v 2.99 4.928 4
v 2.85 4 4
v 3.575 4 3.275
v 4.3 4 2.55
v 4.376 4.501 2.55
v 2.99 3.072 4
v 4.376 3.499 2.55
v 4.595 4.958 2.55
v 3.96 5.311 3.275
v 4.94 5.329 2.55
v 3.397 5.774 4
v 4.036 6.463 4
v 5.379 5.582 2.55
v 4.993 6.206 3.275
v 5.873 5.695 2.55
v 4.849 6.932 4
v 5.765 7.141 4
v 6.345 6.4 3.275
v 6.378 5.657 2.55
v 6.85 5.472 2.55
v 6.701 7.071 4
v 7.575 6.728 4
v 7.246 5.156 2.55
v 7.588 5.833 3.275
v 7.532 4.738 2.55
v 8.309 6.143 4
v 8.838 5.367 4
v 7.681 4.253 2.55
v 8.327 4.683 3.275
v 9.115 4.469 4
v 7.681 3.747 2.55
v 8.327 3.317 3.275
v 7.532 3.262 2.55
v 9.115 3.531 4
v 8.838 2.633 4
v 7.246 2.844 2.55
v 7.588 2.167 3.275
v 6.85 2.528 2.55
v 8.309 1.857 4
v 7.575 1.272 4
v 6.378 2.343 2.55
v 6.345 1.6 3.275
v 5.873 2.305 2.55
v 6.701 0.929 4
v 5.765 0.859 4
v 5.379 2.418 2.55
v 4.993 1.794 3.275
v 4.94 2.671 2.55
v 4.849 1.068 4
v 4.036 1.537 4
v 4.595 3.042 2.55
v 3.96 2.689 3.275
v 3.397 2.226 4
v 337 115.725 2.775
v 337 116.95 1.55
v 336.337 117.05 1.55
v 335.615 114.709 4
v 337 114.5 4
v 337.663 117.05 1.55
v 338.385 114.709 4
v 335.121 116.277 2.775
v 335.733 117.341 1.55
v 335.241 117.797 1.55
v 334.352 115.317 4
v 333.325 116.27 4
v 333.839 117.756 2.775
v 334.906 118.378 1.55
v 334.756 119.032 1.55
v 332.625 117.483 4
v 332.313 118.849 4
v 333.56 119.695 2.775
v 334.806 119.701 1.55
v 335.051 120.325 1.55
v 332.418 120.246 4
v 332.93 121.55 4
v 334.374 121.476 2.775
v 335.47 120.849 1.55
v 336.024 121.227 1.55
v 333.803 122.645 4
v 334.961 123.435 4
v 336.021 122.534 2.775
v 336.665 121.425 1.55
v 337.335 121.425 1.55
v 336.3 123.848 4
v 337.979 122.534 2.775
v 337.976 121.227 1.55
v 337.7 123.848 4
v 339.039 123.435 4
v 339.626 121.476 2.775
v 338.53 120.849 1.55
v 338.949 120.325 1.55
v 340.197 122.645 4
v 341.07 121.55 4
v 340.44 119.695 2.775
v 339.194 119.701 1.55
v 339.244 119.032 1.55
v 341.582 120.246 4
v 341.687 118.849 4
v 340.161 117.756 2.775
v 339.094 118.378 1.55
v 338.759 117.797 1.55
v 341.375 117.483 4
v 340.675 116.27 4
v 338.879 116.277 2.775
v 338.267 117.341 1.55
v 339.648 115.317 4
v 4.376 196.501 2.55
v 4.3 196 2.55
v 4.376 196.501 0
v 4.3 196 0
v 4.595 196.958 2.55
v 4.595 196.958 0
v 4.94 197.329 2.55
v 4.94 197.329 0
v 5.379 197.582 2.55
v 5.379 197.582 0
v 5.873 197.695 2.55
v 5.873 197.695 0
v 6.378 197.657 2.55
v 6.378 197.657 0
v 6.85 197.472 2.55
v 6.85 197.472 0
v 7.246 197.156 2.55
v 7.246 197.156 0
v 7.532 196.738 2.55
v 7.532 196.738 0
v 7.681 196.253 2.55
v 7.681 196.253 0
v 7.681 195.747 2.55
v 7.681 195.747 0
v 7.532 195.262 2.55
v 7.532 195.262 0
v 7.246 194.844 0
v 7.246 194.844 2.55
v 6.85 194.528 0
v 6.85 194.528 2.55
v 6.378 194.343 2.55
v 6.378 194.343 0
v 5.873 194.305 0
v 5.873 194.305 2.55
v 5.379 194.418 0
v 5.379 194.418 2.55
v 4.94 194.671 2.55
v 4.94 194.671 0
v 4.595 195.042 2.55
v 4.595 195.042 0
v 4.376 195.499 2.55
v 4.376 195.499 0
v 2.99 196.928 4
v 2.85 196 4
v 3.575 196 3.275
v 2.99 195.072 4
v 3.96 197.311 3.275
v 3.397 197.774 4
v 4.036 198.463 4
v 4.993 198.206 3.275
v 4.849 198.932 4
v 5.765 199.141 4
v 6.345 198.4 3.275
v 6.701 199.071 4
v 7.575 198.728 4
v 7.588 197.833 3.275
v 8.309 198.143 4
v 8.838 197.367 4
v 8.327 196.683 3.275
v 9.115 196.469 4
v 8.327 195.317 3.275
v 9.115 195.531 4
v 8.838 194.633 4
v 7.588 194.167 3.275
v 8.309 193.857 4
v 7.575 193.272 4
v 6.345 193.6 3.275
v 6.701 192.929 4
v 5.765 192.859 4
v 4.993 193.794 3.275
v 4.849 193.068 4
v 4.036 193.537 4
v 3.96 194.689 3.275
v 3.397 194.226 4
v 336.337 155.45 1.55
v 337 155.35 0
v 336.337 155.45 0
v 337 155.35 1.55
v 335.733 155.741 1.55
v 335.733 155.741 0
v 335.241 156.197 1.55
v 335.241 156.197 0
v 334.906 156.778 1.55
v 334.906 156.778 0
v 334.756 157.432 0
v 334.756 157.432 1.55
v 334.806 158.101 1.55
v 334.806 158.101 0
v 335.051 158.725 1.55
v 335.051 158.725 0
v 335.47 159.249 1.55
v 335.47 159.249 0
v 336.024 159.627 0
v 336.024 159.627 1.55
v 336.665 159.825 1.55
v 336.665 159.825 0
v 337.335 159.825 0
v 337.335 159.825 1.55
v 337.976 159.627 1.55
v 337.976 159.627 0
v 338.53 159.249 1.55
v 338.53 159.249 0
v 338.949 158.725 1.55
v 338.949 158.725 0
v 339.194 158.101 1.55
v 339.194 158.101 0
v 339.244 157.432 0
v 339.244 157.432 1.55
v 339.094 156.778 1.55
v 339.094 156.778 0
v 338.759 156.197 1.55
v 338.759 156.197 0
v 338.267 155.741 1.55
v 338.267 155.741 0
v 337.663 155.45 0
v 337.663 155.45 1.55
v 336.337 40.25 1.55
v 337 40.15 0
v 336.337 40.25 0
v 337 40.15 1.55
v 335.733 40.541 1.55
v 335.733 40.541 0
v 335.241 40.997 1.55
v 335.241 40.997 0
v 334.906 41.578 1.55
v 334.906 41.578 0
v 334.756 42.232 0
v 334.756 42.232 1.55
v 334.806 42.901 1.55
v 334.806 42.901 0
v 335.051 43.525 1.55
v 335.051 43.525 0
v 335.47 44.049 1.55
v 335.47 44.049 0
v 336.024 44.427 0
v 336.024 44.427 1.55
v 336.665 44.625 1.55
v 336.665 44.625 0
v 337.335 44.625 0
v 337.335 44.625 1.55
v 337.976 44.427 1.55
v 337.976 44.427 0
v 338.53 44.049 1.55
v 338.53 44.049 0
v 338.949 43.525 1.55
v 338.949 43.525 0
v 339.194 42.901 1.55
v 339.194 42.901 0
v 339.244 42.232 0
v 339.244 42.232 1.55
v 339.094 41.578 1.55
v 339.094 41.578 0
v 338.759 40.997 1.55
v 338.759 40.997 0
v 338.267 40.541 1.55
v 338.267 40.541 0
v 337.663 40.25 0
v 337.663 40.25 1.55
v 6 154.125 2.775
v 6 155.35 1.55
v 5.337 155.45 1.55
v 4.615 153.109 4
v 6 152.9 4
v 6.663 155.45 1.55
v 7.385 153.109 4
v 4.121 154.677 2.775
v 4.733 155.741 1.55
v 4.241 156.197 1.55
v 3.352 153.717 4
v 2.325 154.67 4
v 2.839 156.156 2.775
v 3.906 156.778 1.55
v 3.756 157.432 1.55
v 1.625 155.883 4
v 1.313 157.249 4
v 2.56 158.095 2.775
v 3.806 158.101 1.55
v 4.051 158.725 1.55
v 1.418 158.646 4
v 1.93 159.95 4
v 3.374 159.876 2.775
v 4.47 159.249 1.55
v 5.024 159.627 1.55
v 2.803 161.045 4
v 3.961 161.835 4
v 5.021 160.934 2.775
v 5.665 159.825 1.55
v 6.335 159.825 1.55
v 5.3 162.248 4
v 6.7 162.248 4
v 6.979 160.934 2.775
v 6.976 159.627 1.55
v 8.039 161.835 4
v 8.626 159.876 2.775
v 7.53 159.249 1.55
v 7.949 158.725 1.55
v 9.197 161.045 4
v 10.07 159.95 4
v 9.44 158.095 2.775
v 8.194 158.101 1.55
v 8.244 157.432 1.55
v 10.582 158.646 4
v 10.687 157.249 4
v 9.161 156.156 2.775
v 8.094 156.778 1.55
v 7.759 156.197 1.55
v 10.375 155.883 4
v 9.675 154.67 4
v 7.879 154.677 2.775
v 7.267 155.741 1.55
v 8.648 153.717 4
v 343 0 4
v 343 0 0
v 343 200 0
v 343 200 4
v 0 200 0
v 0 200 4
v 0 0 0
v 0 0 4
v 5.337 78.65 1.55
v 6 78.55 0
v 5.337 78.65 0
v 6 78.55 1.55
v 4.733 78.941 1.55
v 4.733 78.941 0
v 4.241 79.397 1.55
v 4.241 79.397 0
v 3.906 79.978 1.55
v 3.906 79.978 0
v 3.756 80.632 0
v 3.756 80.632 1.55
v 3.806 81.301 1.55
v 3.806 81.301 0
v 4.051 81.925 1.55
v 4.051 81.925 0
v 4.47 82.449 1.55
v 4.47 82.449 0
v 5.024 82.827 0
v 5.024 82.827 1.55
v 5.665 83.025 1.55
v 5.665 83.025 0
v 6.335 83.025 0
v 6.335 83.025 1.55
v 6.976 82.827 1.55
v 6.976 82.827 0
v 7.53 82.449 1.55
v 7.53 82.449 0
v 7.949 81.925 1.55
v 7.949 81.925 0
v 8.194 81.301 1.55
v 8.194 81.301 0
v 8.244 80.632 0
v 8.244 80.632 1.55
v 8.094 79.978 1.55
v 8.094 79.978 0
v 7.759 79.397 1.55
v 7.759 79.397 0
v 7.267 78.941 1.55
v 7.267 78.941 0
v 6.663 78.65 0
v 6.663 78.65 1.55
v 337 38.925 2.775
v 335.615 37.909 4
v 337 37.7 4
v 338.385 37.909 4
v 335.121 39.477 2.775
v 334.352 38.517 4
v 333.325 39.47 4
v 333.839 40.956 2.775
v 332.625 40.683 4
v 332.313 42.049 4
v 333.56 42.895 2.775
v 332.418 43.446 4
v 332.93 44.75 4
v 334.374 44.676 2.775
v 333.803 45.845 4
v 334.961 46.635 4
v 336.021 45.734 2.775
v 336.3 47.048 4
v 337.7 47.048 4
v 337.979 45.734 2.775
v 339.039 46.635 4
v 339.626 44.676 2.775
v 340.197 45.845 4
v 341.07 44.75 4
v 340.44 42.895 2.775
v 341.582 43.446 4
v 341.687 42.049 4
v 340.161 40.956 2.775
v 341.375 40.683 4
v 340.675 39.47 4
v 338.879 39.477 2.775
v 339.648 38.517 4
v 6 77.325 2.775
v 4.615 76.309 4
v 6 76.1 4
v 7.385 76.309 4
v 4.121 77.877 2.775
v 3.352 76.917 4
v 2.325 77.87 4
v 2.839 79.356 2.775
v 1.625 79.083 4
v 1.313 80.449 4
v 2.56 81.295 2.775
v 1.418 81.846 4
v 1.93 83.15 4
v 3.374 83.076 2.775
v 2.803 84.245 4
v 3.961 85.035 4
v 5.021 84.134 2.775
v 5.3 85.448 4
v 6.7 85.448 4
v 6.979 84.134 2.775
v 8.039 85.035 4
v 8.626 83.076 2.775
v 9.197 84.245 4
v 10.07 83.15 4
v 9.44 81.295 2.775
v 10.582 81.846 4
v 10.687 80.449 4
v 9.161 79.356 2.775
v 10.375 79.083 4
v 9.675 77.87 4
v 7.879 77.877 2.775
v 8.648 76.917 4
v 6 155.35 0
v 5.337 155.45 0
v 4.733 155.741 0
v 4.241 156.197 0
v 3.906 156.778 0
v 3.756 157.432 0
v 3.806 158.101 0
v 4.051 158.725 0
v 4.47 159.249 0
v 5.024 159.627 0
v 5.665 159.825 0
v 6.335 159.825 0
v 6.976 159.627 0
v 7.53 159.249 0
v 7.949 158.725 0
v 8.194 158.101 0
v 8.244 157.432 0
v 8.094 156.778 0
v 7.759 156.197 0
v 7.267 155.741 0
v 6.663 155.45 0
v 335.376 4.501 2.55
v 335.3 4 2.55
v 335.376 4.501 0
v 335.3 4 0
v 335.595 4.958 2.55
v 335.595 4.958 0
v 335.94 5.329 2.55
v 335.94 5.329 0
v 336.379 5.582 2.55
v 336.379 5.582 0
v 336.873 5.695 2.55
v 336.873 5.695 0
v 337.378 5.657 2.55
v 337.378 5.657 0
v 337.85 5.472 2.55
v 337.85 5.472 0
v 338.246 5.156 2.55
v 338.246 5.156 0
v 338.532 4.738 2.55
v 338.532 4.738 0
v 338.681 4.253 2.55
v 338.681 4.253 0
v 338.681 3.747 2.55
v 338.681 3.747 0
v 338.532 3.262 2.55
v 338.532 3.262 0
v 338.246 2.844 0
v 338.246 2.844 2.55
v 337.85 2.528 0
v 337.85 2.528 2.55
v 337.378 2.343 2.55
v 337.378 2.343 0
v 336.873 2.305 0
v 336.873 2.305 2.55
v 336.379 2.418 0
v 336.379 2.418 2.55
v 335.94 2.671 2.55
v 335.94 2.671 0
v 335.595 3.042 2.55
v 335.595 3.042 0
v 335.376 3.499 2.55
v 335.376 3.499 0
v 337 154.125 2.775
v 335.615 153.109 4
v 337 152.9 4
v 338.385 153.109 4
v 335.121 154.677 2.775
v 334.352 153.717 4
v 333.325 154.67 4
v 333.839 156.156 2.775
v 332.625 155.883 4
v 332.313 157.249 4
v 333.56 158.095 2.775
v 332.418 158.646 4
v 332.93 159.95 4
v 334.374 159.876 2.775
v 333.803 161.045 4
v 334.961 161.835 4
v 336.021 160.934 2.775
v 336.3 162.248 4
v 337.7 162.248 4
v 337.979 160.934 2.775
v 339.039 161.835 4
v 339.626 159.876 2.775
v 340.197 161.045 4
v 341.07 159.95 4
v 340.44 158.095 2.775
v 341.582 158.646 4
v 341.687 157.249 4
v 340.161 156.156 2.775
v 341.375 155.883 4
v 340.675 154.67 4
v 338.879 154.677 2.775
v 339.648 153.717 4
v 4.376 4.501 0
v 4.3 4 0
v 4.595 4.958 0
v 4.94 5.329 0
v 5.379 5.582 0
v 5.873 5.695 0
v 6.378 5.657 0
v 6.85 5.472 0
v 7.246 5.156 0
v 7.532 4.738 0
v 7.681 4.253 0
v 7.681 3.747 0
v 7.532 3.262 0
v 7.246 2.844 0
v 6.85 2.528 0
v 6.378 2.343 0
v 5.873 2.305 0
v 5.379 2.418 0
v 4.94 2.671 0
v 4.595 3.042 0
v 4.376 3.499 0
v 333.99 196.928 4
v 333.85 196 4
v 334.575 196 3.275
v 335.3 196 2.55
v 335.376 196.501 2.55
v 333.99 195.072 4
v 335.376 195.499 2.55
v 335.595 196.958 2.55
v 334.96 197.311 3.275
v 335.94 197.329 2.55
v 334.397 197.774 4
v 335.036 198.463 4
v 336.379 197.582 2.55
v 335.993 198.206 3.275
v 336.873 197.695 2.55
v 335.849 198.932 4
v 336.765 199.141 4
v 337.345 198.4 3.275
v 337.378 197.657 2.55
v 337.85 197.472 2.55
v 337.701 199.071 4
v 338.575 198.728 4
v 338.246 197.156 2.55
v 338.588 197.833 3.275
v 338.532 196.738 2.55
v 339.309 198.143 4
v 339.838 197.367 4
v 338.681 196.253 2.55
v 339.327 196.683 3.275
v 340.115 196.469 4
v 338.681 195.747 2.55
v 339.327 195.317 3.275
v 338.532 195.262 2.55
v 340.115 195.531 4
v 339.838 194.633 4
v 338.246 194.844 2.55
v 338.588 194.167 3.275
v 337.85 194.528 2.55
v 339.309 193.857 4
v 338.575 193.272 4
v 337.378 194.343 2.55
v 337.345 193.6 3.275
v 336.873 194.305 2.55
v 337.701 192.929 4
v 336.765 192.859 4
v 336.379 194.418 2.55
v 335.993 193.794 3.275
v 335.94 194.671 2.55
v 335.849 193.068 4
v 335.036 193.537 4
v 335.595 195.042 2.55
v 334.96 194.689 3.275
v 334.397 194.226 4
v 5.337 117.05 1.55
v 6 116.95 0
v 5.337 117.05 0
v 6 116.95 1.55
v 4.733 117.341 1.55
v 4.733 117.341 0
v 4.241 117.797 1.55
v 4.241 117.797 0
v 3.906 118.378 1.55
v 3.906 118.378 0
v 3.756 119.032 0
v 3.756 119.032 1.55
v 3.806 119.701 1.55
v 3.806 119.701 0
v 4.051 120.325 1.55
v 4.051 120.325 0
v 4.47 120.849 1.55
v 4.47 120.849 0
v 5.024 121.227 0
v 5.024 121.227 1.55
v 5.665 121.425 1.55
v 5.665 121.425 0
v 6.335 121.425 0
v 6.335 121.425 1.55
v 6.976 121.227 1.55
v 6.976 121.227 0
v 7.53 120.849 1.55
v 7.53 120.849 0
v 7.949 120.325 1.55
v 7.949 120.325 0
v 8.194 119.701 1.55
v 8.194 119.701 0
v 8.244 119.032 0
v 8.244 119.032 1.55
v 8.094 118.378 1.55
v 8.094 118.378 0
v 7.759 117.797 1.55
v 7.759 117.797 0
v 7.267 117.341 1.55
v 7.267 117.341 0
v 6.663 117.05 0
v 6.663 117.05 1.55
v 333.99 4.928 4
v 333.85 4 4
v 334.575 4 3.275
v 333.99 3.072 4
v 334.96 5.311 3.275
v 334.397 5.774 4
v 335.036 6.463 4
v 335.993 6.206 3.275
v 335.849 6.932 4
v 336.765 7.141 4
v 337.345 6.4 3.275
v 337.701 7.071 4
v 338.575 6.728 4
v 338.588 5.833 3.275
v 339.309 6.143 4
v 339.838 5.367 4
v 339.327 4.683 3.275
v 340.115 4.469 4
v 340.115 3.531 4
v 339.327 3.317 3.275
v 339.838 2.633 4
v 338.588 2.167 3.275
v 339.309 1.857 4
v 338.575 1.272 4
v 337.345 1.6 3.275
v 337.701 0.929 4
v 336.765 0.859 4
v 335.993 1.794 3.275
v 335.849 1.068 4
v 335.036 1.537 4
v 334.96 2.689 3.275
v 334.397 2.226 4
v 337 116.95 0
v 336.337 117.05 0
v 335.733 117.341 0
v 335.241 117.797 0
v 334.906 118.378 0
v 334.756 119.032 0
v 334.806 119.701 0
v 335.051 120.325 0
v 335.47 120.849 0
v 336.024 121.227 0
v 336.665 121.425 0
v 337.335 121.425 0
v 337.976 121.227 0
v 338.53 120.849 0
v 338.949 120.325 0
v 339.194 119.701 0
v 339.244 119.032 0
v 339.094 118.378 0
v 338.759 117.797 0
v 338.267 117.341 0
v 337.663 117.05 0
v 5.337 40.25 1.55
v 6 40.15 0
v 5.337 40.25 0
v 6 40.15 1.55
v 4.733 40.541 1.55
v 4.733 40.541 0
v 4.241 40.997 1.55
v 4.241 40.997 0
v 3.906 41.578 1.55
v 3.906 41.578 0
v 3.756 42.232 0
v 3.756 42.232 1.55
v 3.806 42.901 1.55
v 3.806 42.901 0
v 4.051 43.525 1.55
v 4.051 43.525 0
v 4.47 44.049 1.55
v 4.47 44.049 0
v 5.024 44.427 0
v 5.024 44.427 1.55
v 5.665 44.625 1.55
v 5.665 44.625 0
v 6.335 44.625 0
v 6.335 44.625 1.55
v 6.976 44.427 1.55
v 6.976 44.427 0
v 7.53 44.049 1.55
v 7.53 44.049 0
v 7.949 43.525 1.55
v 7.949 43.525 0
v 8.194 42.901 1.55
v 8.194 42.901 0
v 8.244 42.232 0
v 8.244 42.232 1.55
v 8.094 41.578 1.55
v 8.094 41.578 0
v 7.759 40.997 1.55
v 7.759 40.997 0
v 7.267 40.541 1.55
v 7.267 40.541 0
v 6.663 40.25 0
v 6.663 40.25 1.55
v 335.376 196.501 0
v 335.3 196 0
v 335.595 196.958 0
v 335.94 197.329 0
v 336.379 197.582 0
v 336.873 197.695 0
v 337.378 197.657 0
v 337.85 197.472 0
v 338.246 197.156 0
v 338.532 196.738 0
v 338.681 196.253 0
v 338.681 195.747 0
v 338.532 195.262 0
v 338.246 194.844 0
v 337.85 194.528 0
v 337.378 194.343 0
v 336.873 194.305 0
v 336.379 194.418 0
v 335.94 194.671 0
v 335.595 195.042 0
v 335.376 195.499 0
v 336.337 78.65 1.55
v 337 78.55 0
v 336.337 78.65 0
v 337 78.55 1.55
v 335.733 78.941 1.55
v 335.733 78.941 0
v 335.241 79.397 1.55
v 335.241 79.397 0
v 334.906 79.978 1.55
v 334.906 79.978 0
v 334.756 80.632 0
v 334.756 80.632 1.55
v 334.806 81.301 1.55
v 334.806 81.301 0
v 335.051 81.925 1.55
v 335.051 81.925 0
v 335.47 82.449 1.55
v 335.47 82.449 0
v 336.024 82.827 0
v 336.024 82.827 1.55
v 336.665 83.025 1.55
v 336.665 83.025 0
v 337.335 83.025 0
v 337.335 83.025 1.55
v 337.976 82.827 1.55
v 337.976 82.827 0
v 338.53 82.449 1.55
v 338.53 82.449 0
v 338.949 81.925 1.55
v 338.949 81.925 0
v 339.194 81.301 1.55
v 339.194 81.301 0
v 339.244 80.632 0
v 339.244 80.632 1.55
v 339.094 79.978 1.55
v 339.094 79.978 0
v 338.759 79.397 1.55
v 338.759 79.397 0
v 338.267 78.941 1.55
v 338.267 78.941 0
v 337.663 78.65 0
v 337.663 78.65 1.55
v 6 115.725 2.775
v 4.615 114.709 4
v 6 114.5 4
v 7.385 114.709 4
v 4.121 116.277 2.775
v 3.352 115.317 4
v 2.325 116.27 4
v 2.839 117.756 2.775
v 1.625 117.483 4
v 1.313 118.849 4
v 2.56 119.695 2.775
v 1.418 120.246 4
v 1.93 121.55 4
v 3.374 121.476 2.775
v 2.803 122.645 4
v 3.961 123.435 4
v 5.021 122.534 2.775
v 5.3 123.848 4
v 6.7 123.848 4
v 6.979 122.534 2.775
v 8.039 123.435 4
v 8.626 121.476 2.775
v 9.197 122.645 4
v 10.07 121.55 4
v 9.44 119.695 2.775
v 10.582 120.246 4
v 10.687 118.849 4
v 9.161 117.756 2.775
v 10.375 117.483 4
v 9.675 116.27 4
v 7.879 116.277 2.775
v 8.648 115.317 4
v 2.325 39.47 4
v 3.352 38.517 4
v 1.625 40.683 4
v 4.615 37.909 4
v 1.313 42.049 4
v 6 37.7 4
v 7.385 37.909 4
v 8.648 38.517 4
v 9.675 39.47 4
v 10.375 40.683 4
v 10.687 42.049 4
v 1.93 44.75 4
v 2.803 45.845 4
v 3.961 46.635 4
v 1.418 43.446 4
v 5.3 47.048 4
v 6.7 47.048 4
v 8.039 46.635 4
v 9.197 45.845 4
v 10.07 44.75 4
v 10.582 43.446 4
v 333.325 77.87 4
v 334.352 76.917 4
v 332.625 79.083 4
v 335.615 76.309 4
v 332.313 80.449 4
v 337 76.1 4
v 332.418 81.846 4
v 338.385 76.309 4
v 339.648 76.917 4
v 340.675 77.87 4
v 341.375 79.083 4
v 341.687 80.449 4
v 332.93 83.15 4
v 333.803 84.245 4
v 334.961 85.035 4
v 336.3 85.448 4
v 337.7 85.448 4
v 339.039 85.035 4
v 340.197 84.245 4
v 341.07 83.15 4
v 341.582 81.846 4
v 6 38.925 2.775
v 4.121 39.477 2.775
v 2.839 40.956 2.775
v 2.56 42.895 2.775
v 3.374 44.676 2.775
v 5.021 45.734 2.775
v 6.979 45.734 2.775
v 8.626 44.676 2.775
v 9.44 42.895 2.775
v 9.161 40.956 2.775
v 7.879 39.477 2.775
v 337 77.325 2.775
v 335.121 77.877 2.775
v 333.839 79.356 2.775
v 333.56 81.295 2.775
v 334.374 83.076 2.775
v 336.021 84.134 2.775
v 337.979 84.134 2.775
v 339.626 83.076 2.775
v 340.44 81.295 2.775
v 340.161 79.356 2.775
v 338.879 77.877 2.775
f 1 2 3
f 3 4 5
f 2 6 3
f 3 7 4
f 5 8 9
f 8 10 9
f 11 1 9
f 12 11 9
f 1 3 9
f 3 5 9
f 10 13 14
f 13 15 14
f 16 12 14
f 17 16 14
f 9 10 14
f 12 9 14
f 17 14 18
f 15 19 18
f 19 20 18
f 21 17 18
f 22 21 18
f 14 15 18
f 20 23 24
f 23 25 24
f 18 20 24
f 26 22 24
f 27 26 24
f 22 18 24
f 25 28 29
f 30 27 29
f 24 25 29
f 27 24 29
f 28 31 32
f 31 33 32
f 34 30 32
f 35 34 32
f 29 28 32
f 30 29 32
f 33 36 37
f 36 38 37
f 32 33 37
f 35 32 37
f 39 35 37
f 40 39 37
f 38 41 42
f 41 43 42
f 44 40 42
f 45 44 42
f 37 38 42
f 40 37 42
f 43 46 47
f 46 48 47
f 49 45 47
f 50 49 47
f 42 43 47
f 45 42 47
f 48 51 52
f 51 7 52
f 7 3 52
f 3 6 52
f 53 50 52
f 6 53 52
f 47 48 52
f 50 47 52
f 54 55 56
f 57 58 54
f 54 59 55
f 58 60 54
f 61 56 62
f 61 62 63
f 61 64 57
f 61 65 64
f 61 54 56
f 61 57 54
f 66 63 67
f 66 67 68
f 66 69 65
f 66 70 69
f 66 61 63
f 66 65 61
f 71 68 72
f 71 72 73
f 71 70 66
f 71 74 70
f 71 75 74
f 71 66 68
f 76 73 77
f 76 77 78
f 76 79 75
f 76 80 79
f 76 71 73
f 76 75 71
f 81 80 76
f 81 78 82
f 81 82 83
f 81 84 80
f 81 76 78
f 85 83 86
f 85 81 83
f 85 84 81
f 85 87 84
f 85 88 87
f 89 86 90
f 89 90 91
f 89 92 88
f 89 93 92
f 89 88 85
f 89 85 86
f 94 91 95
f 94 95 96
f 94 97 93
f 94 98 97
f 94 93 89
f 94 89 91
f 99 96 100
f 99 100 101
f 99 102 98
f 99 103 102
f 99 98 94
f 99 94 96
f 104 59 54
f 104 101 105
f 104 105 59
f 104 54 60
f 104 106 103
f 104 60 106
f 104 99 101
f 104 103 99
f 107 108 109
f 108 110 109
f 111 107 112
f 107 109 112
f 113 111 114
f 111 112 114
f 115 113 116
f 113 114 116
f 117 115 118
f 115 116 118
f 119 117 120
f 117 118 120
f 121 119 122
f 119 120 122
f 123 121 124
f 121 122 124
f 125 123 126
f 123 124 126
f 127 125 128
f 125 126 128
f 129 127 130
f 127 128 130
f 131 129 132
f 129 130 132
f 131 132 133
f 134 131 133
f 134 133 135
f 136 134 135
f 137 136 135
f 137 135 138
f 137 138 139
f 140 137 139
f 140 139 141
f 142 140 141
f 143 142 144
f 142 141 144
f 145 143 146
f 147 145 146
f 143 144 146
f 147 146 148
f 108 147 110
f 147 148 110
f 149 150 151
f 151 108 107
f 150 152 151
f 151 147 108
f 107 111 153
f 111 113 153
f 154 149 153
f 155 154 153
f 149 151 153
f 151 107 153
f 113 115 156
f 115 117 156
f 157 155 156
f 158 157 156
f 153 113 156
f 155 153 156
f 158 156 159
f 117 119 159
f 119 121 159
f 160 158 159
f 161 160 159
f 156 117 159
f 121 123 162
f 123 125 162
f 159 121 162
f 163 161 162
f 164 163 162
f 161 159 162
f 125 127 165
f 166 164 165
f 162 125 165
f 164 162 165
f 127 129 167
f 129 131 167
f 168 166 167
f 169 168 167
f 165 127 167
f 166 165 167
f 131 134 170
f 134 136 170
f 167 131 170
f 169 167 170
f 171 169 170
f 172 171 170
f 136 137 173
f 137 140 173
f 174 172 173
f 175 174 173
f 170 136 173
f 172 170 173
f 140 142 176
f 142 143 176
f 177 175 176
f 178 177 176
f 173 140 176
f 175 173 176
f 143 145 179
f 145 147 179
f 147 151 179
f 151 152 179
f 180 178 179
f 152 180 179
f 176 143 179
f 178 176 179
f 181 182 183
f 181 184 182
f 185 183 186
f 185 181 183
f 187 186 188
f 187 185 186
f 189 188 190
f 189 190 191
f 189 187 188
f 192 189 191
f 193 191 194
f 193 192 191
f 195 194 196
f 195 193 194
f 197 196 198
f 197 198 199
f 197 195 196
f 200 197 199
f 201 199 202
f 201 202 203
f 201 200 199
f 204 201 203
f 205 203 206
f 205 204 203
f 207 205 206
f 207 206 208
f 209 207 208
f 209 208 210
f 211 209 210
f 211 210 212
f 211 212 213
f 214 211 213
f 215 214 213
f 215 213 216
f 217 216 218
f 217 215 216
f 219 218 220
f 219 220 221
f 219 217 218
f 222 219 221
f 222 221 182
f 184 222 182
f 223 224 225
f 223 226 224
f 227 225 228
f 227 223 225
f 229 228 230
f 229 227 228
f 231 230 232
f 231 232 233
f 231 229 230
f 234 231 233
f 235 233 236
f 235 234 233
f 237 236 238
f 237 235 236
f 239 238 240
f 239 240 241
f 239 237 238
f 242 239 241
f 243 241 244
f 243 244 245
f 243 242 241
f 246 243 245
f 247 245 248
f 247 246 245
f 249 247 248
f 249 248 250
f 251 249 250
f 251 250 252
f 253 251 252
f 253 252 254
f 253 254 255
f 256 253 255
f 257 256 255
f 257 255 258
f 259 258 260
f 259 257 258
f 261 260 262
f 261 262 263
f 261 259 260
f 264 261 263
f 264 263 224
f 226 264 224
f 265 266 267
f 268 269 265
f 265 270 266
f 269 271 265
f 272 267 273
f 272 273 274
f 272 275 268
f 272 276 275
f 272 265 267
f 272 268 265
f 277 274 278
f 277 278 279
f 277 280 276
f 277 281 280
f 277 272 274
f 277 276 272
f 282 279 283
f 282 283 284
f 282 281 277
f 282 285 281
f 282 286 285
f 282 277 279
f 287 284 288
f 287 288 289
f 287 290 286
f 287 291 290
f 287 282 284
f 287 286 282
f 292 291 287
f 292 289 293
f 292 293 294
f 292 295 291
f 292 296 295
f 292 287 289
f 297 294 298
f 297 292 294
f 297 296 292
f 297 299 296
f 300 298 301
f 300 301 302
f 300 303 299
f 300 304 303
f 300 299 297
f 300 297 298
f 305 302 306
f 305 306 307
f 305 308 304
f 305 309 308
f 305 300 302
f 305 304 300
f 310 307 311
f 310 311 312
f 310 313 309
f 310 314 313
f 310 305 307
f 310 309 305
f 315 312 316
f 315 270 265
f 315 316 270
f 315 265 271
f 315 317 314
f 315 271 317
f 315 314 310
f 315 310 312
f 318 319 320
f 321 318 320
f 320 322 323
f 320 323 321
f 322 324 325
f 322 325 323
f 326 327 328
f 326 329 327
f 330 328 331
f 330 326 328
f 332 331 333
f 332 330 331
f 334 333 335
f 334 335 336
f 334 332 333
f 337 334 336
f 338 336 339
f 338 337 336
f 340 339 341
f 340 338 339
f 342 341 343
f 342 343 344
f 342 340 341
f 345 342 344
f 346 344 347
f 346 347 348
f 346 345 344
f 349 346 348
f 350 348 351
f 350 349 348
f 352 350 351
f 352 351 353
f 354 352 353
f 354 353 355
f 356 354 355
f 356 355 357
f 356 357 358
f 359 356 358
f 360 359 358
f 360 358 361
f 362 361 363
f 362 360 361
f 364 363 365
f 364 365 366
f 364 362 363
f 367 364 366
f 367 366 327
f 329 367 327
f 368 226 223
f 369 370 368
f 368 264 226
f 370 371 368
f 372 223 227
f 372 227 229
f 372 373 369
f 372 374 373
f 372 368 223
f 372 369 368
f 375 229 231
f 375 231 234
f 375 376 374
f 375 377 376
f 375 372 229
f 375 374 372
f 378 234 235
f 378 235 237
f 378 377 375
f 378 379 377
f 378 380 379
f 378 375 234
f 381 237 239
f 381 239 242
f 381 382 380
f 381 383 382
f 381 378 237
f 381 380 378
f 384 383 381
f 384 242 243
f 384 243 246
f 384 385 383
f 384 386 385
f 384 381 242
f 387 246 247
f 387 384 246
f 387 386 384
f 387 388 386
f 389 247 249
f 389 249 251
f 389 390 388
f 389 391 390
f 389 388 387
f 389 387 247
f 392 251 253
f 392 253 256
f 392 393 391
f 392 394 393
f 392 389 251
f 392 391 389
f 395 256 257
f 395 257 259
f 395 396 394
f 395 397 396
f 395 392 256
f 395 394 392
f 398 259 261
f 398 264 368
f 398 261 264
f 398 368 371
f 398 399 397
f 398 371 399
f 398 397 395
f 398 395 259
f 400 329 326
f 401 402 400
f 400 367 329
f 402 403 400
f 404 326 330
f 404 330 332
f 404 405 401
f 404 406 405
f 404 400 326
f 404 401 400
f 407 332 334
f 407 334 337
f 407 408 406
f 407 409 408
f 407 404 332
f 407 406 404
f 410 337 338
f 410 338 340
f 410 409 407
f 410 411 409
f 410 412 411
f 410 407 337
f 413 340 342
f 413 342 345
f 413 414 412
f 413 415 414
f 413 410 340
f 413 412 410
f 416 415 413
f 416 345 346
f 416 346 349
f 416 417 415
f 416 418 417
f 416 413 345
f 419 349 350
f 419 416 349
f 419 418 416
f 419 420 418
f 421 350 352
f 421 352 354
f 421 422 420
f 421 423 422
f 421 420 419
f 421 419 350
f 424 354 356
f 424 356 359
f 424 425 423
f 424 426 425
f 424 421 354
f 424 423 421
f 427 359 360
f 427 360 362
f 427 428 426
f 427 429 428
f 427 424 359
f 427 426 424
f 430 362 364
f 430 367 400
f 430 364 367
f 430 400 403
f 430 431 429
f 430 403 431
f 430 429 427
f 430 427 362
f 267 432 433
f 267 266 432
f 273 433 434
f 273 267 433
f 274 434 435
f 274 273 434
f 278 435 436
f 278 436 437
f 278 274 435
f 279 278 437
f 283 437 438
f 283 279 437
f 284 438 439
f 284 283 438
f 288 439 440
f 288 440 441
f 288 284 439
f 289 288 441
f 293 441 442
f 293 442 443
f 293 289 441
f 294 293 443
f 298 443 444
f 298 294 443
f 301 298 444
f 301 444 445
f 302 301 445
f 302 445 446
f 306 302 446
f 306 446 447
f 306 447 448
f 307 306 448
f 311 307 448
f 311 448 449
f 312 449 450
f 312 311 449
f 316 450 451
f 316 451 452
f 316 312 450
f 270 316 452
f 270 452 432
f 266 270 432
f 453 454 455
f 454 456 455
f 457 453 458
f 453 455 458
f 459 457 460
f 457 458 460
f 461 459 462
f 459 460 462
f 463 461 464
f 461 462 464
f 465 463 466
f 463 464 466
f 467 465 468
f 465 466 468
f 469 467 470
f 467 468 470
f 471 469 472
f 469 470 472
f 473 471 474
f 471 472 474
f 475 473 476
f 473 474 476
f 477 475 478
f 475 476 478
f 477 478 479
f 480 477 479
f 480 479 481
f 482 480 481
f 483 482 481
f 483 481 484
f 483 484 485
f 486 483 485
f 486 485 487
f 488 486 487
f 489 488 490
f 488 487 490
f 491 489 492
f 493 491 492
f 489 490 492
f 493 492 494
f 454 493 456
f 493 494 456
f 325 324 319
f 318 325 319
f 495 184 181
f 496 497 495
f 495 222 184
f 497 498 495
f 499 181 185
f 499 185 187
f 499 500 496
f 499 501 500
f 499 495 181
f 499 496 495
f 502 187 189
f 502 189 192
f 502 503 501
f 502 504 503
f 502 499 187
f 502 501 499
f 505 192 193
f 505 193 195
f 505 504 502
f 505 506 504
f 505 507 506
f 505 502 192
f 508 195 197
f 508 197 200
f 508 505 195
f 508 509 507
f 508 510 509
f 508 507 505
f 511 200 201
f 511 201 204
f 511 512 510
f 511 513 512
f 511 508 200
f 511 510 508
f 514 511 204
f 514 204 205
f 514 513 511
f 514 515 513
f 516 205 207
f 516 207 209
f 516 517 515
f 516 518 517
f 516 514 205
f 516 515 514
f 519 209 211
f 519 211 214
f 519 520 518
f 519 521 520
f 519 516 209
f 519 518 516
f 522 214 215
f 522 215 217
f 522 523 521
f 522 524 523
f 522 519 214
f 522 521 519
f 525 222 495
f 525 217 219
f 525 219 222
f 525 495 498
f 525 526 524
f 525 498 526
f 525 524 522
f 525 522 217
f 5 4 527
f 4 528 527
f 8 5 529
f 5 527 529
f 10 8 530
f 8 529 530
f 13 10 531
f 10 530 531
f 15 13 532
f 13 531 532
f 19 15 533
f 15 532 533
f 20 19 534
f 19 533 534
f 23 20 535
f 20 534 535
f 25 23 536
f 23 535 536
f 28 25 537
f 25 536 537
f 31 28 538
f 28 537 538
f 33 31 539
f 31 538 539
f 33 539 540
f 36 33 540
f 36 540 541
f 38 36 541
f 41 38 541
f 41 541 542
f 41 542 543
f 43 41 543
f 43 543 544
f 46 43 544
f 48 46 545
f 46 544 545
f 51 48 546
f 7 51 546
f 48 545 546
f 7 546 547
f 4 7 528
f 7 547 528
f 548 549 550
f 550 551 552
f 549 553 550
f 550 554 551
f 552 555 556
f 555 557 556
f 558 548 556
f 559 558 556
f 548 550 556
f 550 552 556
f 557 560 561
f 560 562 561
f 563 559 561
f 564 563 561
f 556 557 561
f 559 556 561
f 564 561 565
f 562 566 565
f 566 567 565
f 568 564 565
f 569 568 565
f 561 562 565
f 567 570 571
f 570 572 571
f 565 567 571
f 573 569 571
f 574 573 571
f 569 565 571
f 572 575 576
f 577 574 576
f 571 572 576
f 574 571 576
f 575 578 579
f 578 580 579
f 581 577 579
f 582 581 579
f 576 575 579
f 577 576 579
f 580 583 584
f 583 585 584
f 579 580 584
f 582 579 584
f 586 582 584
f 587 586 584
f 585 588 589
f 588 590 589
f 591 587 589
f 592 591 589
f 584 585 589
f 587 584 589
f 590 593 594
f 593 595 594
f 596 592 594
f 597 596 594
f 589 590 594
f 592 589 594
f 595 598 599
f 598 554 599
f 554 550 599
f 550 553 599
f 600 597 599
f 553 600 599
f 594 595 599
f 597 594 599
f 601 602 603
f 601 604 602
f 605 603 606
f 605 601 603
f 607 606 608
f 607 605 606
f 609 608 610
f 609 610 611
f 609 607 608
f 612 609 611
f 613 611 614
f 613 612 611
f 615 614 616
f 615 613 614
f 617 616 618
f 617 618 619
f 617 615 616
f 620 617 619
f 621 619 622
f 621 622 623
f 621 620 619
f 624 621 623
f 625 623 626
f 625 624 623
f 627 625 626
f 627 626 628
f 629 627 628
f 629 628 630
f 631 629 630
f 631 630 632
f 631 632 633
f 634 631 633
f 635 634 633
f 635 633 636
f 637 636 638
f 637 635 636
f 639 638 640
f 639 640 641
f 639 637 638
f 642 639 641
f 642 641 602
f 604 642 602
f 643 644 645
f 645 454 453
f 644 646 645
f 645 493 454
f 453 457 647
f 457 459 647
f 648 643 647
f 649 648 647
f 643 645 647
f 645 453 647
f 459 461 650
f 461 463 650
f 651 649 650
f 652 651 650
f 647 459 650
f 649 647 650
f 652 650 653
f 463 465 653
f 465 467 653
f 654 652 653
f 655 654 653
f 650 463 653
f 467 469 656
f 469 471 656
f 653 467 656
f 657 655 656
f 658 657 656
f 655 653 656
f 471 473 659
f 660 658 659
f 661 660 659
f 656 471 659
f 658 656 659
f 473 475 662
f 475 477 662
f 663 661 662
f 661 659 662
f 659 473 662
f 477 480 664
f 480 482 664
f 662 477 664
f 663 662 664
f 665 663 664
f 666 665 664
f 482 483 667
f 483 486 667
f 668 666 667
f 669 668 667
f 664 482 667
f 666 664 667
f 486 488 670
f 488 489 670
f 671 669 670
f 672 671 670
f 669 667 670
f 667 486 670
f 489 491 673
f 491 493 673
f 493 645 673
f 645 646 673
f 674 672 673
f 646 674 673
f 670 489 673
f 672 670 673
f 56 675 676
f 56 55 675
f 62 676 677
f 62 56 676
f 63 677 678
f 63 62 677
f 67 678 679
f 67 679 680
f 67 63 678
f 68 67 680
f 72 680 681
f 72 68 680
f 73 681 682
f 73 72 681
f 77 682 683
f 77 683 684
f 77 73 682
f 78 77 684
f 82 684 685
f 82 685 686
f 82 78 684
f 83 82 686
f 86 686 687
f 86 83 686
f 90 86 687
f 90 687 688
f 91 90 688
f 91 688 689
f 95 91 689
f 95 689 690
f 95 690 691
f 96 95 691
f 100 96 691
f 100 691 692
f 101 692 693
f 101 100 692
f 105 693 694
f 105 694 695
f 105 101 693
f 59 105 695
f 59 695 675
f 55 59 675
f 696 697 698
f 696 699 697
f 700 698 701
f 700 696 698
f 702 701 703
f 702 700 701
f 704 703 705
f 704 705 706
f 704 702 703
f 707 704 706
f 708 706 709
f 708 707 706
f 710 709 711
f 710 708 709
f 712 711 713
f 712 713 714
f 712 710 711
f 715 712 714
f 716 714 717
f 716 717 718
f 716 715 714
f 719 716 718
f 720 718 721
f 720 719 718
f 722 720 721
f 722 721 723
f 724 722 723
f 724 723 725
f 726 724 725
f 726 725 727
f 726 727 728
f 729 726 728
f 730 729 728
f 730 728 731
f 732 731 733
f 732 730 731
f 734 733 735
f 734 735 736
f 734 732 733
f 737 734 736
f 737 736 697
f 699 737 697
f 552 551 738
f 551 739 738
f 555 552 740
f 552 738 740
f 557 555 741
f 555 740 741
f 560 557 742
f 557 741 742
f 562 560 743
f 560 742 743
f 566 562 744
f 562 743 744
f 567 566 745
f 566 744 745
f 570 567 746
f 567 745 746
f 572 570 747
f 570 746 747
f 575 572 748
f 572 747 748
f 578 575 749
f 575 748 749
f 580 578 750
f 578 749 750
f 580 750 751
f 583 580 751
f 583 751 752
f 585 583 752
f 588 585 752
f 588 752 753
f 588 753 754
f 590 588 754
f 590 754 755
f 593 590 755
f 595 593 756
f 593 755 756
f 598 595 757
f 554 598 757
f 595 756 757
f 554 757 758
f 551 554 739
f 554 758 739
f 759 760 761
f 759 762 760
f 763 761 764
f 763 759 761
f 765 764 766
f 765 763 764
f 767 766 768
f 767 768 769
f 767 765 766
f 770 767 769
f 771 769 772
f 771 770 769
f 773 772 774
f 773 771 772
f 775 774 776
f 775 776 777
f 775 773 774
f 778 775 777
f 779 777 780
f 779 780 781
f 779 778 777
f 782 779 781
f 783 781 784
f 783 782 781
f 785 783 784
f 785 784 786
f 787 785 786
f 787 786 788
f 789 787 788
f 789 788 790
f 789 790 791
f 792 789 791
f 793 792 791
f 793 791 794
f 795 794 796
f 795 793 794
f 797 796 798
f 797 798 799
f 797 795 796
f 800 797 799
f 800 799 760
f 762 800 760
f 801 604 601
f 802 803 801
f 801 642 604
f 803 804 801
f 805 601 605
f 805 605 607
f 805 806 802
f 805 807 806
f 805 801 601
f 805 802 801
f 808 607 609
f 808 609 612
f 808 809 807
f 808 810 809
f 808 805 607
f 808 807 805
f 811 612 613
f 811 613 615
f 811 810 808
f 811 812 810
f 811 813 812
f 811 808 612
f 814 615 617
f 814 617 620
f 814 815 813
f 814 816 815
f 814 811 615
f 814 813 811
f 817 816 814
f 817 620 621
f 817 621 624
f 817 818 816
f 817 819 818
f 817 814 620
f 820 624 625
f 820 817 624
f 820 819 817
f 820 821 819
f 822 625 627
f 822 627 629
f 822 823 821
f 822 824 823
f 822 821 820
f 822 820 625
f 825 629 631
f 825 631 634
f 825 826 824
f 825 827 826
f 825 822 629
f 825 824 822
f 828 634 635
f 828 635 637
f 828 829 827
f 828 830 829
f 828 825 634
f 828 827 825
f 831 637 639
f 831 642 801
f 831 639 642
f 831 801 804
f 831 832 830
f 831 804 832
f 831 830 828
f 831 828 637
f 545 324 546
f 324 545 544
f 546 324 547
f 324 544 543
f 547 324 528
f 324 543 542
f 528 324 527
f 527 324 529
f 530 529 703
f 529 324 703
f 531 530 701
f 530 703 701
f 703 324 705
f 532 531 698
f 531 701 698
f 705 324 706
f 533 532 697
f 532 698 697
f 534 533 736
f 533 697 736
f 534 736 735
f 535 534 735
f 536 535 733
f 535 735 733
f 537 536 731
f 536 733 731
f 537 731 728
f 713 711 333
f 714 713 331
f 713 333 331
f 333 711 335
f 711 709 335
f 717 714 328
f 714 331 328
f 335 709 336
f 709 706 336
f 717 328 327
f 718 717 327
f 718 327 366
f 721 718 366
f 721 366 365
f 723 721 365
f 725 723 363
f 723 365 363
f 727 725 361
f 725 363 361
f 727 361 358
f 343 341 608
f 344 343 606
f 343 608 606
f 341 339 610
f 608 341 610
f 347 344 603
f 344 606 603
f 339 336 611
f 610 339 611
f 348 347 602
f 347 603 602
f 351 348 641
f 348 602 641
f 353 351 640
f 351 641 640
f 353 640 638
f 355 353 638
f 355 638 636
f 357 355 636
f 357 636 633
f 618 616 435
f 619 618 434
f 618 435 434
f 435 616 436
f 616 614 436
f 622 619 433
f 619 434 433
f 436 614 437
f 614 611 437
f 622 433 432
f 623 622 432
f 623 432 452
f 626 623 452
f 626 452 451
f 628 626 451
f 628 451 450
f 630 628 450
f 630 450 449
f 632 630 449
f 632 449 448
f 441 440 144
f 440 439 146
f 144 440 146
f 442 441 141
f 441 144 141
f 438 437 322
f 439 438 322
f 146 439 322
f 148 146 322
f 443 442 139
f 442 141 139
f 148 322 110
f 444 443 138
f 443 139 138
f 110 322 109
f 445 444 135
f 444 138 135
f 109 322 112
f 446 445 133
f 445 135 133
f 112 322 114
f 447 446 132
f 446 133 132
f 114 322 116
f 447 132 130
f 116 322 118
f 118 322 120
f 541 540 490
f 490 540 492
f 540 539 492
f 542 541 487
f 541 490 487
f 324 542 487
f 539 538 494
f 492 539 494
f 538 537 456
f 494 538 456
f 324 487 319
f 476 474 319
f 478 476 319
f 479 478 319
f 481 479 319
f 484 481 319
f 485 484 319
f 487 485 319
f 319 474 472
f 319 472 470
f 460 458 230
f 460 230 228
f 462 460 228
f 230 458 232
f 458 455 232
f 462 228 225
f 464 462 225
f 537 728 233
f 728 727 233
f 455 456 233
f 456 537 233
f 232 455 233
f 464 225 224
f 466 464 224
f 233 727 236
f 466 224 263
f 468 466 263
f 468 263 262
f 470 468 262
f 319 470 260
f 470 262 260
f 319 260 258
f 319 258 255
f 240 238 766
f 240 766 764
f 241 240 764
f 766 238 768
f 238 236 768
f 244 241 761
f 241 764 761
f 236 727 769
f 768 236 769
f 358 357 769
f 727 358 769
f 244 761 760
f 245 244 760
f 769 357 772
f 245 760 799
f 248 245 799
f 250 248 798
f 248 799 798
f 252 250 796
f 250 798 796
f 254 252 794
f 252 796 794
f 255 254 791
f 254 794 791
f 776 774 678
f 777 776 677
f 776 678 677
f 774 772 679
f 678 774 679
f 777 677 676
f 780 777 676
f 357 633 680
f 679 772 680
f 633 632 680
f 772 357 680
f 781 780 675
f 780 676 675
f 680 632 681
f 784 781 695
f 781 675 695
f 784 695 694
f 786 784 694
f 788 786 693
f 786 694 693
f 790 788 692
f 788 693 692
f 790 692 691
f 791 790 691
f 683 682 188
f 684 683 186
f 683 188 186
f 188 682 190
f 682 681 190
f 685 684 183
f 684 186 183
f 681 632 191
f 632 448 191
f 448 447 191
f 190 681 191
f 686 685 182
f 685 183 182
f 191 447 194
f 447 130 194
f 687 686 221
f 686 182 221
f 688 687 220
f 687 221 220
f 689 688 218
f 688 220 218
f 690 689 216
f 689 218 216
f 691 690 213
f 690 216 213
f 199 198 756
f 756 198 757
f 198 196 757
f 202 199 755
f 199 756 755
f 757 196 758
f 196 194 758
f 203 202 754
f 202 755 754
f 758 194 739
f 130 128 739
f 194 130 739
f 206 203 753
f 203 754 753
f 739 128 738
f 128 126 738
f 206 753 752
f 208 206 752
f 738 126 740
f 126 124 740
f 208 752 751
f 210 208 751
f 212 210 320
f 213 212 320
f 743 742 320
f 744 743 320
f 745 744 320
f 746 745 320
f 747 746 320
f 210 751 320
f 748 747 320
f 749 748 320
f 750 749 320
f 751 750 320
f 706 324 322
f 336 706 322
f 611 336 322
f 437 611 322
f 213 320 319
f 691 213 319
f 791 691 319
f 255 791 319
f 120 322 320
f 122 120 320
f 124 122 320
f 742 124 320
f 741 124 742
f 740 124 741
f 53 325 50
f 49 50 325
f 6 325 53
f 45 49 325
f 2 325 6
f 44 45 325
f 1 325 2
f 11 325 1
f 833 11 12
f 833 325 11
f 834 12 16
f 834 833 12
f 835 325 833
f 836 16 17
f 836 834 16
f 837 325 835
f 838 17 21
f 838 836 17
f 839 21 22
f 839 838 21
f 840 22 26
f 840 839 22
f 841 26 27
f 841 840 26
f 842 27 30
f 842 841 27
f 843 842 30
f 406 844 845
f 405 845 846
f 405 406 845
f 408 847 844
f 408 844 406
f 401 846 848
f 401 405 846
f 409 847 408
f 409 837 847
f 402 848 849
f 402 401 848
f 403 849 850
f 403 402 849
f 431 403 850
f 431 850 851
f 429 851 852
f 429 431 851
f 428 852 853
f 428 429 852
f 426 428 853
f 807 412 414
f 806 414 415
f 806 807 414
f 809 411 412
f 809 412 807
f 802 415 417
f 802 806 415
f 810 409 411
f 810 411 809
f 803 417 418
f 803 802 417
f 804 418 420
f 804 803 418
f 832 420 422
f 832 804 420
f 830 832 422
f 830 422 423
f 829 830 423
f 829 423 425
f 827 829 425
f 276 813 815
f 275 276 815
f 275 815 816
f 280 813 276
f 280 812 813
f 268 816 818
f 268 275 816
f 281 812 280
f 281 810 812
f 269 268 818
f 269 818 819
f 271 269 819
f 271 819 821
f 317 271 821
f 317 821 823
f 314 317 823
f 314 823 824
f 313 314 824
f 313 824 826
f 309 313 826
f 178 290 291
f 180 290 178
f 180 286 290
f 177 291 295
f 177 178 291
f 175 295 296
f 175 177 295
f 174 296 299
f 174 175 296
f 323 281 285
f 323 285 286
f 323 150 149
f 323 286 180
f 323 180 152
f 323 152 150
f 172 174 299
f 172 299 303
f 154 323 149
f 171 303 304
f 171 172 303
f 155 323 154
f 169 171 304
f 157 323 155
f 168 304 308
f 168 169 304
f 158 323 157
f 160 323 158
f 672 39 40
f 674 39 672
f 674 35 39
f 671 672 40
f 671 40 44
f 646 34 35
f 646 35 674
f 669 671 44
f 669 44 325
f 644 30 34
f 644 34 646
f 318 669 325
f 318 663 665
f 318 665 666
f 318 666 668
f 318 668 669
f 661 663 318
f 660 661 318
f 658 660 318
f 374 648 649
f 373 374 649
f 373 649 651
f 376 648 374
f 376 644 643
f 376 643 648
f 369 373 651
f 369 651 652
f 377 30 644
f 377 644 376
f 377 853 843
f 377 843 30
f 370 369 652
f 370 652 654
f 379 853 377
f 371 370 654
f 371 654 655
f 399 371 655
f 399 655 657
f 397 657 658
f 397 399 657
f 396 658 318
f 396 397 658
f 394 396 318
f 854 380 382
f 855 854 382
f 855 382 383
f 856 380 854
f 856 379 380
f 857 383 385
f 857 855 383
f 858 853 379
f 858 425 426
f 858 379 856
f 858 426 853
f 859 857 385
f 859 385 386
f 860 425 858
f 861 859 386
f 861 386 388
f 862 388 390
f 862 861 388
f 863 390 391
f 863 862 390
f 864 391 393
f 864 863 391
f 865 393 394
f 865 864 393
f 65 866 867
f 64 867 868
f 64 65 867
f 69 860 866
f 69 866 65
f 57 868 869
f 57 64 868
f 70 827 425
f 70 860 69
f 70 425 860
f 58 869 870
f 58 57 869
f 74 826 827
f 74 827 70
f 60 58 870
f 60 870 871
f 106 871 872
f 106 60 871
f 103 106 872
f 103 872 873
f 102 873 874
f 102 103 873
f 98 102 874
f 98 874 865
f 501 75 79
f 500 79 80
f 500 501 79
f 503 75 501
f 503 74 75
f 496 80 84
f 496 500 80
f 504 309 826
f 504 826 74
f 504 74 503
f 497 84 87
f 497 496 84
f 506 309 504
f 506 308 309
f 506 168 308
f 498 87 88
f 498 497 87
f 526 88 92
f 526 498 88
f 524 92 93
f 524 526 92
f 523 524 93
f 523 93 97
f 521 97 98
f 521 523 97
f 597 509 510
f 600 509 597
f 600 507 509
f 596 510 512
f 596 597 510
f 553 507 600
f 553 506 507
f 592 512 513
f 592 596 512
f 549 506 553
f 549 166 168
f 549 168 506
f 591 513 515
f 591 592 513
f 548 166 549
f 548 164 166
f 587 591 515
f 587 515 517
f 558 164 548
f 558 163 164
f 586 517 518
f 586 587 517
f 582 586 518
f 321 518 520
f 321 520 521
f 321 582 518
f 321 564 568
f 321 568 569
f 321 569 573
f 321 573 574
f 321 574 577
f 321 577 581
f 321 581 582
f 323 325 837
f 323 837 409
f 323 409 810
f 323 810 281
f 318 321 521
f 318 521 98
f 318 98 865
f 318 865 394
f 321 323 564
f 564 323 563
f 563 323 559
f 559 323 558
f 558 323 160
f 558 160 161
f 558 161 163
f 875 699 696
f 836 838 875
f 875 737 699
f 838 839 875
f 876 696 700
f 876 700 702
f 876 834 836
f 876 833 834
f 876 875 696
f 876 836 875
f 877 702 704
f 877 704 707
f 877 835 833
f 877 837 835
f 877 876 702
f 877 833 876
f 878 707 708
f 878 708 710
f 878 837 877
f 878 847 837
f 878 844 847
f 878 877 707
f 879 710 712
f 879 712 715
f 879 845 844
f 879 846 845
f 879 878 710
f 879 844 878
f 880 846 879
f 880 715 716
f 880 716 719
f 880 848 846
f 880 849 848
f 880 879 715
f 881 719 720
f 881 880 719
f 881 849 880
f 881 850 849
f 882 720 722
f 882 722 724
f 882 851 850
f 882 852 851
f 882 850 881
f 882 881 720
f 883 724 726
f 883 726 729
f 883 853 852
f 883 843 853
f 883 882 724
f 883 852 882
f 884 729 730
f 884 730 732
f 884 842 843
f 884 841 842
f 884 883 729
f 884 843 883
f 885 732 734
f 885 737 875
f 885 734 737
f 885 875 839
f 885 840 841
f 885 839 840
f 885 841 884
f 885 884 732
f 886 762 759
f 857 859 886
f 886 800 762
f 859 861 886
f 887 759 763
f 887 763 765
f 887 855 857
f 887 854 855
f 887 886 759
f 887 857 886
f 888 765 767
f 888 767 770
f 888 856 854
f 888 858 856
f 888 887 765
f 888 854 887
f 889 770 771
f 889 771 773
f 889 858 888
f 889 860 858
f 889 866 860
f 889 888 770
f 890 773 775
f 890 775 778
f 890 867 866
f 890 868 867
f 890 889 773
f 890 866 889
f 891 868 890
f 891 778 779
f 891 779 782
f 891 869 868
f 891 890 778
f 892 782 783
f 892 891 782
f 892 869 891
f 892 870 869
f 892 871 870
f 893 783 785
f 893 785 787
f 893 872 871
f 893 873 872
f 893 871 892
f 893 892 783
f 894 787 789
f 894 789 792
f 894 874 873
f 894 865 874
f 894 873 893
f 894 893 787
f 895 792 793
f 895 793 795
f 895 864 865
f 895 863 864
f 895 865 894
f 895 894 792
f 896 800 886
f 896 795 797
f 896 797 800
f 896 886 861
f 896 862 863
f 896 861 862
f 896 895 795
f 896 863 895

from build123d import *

# Parameters (mm, degrees)
SKETCH1_W                                           = 343
SKETCH1_H                                           = 200
EXTRUDE1_DEPTH                                      = 4
CSK_FOR_M3_COUNTERSUNK_FLAT_HEAD_SCREW1_D           = 3.4
CSK_FOR_M3_COUNTERSUNK_FLAT_HEAD_SCREW1_CSINK_D     = 6.3
CSK_FOR_M3_COUNTERSUNK_FLAT_HEAD_SCREW1_CSINK_ANGLE = 90
CSK_FOR_M4_COUNTERSUNK_FLAT_HEAD_SCR_2_COUNT        = 2
CSK_FOR_M4_COUNTERSUNK_FLAT_HEAD_SCR_2_PITCH        = 331
LPATTERN1_COUNT                                     = 4
LPATTERN1_PITCH                                     = 38.4


with BuildPart() as part:
    # Sketch1 → Extrude1 (new body)
    with BuildSketch(Plane.XY):
        with Locations((171.5, 100)):
            Rectangle(SKETCH1_W, SKETCH1_H)
    extrude(amount=EXTRUDE1_DEPTH)

    # CSK for M3 Countersunk Flat Head Screw1 (through all)
    with Locations(Plane(origin=(6, 196, 4), x_dir=(1, 0, 0), z_dir=(0, 0, 1))):
        with Locations((0, 0), (0, -192), (331, -192), (331, 0)):
            CounterSinkHole(CSK_FOR_M3_COUNTERSUNK_FLAT_HEAD_SCREW1_D / 2, CSK_FOR_M3_COUNTERSUNK_FLAT_HEAD_SCREW1_CSINK_D / 2, counter_sink_angle=CSK_FOR_M3_COUNTERSUNK_FLAT_HEAD_SCREW1_CSINK_ANGLE)

    # Sketch4 → CSK for M4 Countersunk Flat Head Screw1 (revolve, cut)
    with BuildSketch(Plane(origin=(6, 42.4, 4), x_dir=(0, -1, 0), z_dir=(1, 0, 0))):
        Polygon((0, 0), (0, 4), (2.25, 4), (2.25, 2.45), (4.7, 0), align=None)
    csk_for_m4_countersunk_flat_head_screw1 = revolve(axis=Axis((6, 42.4, 10.35), (0, 0, -1)), mode=Mode.SUBTRACT)

    # CSK for M4 Countersunk Flat Head Scr 2: CSK for M4 Countersunk Flat Head Screw1 ×2
    with Locations(*[(i * CSK_FOR_M4_COUNTERSUNK_FLAT_HEAD_SCR_2_PITCH, 0, 0) for i in range(1, CSK_FOR_M4_COUNTERSUNK_FLAT_HEAD_SCR_2_COUNT)]):
        add(csk_for_m4_countersunk_flat_head_screw1, mode=Mode.SUBTRACT)

    # LPattern1: CSK for M4 Countersunk Flat Head Screw1 ×4
    with Locations(*[(0, i * LPATTERN1_PITCH, 0) for i in range(1, LPATTERN1_COUNT)]):
        add(csk_for_m4_countersunk_flat_head_screw1, mode=Mode.SUBTRACT)

    # LPattern1 copy 1 sketch → LPattern1 copy 1 (revolve, cut)
    with BuildSketch(Plane(origin=(337, 80.8, 4), x_dir=(0, -1, 0), z_dir=(1, 0, 0))):
        Polygon((0, 0), (0, 4), (2.25, 4), (2.25, 2.45), (4.7, 0), align=None)
    revolve(axis=Axis((337, 80.8, 10.35), (0, 0, -1)), mode=Mode.SUBTRACT)

    # LPattern1 copy 2 sketch → LPattern1 copy 2 (revolve, cut)
    with BuildSketch(Plane(origin=(337, 119.2, 4), x_dir=(0, -1, 0), z_dir=(1, 0, 0))):
        Polygon((0, 0), (0, 4), (2.25, 4), (2.25, 2.45), (4.7, 0), align=None)
    revolve(axis=Axis((337, 119.2, 10.35), (0, 0, -1)), mode=Mode.SUBTRACT)

    # LPattern1 copy 3 sketch → LPattern1 copy 3 (revolve, cut)
    with BuildSketch(Plane(origin=(337, 157.6, 4), x_dir=(0, -1, 0), z_dir=(1, 0, 0))):
        Polygon((0, 0), (0, 4), (2.25, 4), (2.25, 2.45), (4.7, 0), align=None)
    revolve(axis=Axis((337, 157.6, 10.35), (0, 0, -1)), mode=Mode.SUBTRACT)


solid = part.part
